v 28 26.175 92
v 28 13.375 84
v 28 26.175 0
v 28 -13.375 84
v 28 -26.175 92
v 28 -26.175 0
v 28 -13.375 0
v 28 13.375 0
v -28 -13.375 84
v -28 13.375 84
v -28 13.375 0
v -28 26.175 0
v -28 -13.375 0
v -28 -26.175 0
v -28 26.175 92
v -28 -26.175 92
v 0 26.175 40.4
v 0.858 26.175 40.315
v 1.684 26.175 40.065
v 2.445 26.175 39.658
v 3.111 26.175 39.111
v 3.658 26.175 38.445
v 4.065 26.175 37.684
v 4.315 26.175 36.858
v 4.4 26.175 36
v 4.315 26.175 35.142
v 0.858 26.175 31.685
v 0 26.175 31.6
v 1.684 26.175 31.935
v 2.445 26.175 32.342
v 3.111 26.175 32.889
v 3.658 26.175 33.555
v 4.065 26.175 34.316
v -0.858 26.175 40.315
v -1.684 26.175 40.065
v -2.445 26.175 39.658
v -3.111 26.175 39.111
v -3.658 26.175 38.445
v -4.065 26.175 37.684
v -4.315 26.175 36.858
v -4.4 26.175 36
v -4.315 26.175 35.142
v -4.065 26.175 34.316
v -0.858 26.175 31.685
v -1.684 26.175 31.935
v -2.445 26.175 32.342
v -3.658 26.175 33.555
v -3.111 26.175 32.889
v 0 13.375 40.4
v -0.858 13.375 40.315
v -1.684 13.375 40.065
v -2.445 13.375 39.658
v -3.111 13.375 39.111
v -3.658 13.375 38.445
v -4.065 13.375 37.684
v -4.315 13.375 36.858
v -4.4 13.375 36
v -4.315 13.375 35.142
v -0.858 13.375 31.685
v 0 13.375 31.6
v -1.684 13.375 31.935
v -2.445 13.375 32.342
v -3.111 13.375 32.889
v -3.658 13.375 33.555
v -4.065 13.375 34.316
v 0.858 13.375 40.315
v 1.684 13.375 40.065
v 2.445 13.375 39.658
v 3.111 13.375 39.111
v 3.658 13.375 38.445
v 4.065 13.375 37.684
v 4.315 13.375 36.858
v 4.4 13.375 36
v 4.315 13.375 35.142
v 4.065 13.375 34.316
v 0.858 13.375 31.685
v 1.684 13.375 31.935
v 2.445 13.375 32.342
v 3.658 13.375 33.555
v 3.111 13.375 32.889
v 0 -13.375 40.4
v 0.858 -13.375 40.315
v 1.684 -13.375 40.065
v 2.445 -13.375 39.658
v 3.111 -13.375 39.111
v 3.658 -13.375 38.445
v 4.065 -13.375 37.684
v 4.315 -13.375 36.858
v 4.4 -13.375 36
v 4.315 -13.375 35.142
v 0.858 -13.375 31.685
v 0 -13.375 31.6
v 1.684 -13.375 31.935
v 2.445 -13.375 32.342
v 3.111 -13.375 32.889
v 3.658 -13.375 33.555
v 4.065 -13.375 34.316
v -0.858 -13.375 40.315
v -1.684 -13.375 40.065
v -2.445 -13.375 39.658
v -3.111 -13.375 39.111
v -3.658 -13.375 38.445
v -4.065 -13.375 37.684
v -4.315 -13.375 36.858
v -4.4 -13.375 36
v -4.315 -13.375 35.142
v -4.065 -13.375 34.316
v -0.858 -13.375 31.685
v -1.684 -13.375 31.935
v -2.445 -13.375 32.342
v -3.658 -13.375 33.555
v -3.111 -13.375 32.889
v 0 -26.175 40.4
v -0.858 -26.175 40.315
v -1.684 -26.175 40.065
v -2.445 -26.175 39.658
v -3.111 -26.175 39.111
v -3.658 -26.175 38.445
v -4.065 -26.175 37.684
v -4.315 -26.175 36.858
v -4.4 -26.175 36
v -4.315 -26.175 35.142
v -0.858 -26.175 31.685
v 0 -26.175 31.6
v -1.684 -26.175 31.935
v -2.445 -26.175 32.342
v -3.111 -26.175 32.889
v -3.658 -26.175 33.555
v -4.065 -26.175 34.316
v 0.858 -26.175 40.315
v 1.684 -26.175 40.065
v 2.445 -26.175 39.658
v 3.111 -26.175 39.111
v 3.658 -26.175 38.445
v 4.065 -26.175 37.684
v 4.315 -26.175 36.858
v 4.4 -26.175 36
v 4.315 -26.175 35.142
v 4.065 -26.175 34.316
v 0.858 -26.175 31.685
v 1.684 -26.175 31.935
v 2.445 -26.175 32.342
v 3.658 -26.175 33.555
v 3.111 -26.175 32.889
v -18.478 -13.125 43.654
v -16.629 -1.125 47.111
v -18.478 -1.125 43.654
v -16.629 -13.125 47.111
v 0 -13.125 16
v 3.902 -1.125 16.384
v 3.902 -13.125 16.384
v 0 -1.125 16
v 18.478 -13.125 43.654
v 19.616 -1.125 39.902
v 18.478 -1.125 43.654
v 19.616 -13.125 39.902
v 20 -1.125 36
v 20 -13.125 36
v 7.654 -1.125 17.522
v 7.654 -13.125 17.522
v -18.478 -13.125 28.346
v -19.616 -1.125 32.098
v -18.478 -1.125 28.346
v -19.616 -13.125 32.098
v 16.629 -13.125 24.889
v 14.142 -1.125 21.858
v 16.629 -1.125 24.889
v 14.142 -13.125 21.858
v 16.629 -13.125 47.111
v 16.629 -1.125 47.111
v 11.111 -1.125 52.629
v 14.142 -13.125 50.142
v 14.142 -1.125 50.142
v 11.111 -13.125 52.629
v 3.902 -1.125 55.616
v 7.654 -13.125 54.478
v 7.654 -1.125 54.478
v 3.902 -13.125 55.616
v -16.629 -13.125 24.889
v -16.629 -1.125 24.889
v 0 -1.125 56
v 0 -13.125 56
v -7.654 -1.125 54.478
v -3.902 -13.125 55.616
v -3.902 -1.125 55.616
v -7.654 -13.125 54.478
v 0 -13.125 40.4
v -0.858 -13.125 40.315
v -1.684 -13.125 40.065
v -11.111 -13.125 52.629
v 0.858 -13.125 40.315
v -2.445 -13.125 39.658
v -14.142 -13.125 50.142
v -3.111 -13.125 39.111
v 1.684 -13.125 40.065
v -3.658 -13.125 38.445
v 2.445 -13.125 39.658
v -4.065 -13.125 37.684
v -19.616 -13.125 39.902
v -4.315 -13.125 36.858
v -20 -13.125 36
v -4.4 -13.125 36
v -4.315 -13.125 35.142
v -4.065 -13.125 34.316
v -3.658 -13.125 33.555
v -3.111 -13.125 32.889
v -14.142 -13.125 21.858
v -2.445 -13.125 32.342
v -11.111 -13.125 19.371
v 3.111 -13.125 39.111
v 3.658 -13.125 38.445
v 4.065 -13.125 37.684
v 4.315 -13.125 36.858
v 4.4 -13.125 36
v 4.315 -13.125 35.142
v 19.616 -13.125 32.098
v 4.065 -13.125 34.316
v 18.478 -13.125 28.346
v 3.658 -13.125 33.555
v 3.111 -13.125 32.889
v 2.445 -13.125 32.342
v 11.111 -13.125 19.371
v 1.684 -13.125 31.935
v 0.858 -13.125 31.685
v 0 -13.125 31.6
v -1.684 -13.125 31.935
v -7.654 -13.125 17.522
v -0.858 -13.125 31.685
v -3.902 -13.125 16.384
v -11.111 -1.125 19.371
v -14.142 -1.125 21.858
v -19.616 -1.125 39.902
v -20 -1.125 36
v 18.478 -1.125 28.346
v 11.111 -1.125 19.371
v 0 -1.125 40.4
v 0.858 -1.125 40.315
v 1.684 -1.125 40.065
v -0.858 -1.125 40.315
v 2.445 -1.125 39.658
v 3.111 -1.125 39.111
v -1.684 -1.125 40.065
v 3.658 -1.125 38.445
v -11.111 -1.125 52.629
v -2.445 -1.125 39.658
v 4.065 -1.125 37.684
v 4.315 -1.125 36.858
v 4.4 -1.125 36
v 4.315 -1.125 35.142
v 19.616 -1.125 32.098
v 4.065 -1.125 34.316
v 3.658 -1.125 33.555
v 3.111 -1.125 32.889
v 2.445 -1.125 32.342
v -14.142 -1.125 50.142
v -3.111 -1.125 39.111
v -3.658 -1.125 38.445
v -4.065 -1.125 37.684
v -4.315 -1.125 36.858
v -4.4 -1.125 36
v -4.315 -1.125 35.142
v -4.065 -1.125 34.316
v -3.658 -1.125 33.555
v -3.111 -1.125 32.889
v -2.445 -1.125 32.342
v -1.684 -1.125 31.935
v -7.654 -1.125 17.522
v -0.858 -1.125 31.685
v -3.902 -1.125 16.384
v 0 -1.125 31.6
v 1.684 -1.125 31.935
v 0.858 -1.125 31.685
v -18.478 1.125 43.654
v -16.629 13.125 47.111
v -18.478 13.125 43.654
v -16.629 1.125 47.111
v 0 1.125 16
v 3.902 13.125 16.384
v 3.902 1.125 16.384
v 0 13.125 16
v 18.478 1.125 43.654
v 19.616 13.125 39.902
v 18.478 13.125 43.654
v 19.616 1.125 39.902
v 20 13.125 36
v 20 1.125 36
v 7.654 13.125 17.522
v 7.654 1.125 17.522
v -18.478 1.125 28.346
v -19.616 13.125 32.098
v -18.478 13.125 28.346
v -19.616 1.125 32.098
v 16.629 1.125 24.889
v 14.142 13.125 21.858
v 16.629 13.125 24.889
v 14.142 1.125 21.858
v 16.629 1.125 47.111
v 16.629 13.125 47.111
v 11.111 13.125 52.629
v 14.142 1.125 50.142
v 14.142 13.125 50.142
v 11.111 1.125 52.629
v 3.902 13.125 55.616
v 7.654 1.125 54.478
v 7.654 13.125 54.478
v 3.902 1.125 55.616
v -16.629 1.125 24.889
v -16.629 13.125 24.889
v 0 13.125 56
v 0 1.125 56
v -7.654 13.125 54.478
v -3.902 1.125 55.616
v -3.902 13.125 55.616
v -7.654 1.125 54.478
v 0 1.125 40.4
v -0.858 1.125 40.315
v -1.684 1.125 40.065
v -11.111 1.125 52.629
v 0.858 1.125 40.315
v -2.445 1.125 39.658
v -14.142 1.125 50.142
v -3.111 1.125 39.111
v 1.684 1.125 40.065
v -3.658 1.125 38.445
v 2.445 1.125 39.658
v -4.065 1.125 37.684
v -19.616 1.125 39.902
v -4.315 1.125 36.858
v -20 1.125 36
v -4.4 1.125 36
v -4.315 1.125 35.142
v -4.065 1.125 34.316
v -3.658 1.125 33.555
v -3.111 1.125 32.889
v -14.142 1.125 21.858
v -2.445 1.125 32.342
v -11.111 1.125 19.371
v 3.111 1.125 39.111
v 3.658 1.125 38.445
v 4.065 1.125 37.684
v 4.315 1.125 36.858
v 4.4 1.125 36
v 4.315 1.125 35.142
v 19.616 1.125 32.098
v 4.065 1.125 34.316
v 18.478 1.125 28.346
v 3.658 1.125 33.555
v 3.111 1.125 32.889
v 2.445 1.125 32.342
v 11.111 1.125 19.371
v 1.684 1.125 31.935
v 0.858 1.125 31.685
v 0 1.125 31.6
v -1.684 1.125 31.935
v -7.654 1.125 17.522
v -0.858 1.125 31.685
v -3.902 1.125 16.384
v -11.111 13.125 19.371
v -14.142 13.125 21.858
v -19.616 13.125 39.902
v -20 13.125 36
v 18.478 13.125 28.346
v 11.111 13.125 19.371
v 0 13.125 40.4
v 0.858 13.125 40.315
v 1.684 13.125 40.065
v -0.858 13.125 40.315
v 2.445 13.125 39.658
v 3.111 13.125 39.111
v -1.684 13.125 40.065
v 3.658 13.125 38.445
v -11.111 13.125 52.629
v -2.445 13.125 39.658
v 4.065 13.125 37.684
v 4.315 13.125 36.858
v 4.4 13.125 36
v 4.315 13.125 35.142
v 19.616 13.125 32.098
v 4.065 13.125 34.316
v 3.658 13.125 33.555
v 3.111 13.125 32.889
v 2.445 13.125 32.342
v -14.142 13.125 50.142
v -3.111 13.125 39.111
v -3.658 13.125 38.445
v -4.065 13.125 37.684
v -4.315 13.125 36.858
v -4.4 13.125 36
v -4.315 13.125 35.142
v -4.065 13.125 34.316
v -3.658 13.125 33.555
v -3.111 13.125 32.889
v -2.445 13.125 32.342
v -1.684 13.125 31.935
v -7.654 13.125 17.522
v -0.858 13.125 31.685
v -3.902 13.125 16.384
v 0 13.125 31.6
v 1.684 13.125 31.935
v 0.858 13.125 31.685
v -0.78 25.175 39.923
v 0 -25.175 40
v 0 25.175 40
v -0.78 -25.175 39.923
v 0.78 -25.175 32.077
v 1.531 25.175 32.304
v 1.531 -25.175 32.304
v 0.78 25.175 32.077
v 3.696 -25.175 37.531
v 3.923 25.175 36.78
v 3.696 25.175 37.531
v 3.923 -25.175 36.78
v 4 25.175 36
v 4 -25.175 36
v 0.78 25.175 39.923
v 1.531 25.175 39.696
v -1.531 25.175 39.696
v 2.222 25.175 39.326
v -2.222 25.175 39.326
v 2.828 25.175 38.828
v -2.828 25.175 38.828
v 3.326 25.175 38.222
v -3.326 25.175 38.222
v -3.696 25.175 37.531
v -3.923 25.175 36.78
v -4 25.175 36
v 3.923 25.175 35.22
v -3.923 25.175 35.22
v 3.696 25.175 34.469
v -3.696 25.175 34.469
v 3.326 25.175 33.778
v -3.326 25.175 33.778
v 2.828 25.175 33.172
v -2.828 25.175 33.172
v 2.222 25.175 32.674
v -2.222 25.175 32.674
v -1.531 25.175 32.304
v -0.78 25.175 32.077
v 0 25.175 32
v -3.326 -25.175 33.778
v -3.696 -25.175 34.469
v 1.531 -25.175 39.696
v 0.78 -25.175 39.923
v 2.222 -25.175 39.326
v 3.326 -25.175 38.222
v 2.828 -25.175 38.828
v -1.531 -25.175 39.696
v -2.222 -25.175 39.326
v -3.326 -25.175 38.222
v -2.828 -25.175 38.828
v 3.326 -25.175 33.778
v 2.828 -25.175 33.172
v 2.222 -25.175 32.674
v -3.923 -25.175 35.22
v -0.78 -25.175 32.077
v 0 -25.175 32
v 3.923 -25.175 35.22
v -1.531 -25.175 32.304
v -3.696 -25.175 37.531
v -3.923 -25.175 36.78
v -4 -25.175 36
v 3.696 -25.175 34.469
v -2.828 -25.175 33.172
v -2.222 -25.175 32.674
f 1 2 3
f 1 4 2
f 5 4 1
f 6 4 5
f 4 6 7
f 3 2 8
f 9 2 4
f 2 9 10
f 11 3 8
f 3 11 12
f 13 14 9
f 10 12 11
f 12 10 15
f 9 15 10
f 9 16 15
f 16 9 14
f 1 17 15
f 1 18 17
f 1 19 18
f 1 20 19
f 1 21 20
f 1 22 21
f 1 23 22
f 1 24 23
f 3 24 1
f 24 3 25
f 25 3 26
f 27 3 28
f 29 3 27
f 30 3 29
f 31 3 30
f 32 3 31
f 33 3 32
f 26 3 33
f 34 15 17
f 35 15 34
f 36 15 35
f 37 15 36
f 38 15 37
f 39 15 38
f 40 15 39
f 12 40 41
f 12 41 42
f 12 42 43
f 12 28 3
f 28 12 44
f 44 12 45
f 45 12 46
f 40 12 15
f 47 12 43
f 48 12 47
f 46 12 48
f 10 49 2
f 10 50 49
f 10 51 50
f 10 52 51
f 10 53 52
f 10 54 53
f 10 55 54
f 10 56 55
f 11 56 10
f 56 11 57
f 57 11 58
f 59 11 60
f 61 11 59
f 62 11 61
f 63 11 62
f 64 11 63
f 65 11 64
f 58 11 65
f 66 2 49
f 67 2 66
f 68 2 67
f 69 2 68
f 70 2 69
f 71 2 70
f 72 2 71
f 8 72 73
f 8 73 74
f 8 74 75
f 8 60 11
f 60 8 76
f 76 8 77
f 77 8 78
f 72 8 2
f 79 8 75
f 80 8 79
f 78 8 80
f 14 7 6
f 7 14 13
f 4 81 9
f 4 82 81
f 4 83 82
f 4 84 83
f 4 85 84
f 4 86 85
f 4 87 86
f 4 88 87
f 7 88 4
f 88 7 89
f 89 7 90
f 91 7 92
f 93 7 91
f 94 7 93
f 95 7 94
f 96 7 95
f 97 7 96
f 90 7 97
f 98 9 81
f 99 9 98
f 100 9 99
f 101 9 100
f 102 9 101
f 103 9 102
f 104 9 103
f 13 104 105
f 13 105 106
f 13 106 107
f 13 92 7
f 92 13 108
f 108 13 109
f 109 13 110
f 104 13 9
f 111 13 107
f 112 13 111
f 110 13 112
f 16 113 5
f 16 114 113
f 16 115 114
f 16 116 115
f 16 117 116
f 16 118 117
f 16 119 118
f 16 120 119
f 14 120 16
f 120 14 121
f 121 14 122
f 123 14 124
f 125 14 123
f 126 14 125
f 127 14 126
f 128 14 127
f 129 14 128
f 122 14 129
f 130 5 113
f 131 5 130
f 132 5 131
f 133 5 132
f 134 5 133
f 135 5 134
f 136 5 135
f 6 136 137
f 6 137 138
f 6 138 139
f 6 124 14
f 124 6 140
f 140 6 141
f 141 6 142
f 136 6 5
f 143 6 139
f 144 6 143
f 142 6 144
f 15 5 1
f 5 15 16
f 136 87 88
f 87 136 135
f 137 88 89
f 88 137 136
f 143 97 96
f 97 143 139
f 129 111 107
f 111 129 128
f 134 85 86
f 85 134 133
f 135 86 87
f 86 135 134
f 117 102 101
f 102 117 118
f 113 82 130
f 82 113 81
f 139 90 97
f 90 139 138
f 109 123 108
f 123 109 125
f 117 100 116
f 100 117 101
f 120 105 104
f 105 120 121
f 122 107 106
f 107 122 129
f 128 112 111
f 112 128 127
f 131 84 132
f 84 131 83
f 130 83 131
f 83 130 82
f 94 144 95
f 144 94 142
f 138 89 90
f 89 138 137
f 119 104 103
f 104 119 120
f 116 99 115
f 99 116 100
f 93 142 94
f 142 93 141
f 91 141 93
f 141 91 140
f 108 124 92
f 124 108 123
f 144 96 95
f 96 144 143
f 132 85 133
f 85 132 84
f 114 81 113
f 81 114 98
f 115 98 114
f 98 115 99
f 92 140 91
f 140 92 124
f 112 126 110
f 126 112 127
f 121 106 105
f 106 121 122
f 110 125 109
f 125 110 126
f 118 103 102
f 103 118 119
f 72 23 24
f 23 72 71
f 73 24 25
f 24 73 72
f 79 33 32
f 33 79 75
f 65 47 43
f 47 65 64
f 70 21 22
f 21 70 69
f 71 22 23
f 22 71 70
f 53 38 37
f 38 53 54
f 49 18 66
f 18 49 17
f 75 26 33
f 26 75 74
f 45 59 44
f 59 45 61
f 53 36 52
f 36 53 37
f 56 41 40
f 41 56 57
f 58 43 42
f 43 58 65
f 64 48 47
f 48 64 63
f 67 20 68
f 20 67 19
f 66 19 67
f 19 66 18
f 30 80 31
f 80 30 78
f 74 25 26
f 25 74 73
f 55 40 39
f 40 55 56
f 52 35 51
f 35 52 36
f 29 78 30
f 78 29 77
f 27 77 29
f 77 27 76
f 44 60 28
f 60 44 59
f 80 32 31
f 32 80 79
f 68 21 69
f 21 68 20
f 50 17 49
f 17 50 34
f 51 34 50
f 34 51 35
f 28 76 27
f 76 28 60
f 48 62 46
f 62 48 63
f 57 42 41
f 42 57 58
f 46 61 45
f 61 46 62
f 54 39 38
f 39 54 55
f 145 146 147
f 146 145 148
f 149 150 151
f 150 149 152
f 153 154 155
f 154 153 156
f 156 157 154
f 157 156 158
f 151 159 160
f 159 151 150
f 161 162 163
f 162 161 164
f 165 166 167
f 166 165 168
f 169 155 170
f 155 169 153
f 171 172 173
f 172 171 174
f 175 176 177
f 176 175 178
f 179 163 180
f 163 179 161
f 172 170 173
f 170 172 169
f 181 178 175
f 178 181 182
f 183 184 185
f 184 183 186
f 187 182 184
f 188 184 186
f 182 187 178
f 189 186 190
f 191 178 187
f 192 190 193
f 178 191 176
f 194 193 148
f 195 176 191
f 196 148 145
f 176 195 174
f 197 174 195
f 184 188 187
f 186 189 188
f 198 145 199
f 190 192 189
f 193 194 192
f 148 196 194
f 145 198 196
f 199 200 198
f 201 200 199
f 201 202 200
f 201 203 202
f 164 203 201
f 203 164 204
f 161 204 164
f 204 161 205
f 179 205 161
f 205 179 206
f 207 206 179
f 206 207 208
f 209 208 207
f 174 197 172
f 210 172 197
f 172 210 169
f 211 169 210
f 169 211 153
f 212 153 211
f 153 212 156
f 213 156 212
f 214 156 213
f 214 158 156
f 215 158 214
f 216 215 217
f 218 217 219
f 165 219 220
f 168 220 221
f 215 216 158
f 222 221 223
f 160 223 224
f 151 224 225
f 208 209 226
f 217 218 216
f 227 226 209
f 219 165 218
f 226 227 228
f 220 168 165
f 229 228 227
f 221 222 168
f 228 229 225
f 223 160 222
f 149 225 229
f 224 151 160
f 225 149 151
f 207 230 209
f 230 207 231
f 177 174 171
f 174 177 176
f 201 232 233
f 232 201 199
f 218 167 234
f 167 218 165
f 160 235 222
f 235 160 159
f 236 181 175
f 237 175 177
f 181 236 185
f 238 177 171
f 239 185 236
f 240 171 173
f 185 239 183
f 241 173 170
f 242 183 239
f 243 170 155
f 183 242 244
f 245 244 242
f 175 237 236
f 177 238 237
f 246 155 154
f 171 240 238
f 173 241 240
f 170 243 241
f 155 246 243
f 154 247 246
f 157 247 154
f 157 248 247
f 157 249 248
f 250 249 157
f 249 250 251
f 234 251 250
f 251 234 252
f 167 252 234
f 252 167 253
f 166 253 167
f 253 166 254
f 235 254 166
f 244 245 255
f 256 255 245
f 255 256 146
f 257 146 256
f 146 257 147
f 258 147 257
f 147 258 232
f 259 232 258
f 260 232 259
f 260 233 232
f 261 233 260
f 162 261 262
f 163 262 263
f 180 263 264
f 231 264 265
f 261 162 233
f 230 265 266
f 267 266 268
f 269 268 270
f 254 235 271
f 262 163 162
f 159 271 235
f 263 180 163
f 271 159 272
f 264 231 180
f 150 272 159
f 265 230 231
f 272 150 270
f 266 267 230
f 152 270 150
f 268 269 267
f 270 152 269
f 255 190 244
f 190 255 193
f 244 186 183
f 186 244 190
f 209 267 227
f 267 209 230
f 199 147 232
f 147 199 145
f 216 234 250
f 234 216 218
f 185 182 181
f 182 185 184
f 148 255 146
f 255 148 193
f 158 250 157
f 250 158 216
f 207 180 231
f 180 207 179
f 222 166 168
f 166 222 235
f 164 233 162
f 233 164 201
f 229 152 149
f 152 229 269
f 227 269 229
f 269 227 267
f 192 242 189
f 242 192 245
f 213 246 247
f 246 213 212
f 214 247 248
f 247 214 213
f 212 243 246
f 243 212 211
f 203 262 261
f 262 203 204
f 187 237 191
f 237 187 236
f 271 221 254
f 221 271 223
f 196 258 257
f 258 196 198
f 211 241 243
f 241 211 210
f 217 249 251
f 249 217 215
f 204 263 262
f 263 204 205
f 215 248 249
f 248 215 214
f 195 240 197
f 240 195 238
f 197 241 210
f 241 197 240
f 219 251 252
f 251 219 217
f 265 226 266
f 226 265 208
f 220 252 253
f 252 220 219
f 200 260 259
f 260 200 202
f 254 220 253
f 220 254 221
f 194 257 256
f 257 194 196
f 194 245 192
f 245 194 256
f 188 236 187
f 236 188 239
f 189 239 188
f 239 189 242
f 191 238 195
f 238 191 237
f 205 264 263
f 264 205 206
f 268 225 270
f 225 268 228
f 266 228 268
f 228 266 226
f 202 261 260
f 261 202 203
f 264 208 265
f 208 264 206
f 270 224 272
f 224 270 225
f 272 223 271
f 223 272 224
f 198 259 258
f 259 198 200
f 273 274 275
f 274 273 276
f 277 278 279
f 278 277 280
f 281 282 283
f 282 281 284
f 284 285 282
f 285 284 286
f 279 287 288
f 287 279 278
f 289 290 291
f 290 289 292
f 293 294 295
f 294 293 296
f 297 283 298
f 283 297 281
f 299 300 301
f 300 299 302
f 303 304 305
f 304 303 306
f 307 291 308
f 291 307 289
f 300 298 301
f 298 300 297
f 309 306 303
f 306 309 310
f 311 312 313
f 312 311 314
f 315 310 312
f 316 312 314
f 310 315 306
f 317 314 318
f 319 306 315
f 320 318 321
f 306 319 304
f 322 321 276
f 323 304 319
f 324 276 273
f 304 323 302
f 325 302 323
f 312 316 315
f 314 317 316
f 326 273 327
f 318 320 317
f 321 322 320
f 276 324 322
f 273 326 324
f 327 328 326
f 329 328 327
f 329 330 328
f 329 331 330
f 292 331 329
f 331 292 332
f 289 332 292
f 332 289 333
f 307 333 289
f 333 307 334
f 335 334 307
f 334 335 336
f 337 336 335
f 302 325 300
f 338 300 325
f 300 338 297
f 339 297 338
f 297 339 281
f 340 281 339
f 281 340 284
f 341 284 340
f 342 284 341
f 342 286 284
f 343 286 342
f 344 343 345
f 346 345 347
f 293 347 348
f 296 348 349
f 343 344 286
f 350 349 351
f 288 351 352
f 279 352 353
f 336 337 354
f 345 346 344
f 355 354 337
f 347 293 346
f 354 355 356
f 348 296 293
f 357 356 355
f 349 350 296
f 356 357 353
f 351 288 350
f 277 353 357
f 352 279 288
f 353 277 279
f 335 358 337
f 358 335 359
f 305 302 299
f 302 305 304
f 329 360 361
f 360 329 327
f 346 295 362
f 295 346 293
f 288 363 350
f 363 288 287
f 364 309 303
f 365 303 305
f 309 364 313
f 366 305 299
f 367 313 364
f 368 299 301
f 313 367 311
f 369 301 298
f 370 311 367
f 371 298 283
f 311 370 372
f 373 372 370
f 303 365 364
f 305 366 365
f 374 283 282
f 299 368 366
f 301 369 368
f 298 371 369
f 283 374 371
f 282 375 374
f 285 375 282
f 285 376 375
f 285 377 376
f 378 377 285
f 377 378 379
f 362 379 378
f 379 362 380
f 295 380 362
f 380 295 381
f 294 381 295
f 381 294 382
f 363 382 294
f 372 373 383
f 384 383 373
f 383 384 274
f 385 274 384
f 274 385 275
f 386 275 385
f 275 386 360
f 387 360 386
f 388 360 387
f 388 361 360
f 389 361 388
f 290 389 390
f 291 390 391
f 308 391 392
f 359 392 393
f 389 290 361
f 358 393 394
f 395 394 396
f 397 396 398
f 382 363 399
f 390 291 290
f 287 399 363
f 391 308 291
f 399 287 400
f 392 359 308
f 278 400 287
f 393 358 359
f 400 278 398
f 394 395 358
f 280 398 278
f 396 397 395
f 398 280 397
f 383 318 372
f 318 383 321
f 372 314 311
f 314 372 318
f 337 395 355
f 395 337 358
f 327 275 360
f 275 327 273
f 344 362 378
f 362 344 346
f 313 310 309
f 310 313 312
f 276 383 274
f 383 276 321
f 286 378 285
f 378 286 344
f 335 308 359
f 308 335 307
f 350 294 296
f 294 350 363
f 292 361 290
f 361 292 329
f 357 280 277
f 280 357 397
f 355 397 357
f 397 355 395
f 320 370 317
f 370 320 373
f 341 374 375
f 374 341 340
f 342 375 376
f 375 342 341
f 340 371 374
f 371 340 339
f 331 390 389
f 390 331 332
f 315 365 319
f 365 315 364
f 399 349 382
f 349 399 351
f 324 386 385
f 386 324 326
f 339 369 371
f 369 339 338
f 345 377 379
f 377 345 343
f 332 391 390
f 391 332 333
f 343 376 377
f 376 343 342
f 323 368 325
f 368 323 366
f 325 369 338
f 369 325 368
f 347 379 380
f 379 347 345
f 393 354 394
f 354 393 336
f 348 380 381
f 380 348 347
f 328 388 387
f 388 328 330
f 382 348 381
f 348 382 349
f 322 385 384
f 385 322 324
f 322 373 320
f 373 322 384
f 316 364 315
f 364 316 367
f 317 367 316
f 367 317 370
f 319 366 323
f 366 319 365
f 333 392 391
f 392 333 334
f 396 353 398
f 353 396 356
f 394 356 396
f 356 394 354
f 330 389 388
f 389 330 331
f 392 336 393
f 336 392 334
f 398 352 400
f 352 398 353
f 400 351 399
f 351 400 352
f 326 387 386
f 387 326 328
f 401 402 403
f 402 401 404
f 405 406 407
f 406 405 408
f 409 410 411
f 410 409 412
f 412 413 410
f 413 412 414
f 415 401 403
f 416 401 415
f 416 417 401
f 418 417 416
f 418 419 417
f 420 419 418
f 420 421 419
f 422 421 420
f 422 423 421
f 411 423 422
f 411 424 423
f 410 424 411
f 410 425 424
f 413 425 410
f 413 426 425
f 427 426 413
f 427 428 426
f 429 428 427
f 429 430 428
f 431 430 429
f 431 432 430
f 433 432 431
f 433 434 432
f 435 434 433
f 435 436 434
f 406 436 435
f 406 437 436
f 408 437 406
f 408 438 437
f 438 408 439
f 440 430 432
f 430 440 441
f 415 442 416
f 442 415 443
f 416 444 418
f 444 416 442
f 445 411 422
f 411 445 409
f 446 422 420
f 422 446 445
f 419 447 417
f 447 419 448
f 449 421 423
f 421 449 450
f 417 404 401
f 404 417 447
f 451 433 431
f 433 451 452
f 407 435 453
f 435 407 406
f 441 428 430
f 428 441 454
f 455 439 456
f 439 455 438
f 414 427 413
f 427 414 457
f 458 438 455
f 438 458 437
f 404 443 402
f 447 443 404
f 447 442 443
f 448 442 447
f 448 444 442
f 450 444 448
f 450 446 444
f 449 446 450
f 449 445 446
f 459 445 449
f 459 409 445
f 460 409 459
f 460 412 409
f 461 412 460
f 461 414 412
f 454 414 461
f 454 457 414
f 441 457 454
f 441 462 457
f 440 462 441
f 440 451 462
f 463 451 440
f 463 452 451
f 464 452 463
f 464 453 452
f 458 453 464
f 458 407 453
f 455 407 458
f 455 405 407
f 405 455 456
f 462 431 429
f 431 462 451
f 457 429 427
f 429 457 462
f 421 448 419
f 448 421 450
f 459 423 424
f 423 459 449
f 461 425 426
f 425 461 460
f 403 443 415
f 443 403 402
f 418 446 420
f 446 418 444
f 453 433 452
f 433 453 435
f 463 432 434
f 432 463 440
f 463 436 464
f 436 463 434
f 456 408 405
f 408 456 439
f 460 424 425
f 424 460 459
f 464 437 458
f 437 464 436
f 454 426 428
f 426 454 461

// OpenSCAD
$fn = 32;

// ------------------------------------------------------------------------
// Trolley wheel set: wheels d40, fork 84 mm tall
// Every part is its own module, assembly() places every instance.
// ------------------------------------------------------------------------

// --- part 1 ---
module trolley_fork() {
  difference() {
    union() {
      translate([-28, 13.375, 0]) cube([56, 12.8, 84]);
      translate([-28, -26.175, 0]) cube([56, 12.8, 84]);
      translate([-28, -26.175, 84]) cube([56, 52.35, 8]);
    }
    translate([0, -19.775, 36]) rotate([90, 0, 0]) cylinder(h = 14.8, d = 8.8, center = true);
    translate([0, 19.775, 36]) rotate([90, 0, 0]) cylinder(h = 14.8, d = 8.8, center = true);
  }
}

// --- part 2 ---
module trolley_wheel() {
  difference() {
      translate([0, 0, 0]) cylinder(h = 12, d = 40);
      translate([0, 0, -1]) cylinder(h = 14, d = 8.8);
    }
}

// --- part 3 ---
module trolley_axle() {
  translate([0, 0, -25.175]) cylinder(h = 50.35, d = 8);
}

// --- assembly ---
module assembly() {
  color([0.80, 0.24, 0.20]) translate([0, 0, 0]) rotate([0, 0, 0]) trolley_fork();
  color([0.20, 0.45, 0.75]) translate([0, -1.125, 36]) rotate([90, 0, 0]) trolley_wheel();
  color([0.25, 0.62, 0.32]) translate([0, 13.125, 36]) rotate([90, 0, 0]) trolley_wheel();
  color([0.92, 0.70, 0.18]) translate([0, 0, 36]) rotate([90, 0, 0]) trolley_axle();
}

assembly();
